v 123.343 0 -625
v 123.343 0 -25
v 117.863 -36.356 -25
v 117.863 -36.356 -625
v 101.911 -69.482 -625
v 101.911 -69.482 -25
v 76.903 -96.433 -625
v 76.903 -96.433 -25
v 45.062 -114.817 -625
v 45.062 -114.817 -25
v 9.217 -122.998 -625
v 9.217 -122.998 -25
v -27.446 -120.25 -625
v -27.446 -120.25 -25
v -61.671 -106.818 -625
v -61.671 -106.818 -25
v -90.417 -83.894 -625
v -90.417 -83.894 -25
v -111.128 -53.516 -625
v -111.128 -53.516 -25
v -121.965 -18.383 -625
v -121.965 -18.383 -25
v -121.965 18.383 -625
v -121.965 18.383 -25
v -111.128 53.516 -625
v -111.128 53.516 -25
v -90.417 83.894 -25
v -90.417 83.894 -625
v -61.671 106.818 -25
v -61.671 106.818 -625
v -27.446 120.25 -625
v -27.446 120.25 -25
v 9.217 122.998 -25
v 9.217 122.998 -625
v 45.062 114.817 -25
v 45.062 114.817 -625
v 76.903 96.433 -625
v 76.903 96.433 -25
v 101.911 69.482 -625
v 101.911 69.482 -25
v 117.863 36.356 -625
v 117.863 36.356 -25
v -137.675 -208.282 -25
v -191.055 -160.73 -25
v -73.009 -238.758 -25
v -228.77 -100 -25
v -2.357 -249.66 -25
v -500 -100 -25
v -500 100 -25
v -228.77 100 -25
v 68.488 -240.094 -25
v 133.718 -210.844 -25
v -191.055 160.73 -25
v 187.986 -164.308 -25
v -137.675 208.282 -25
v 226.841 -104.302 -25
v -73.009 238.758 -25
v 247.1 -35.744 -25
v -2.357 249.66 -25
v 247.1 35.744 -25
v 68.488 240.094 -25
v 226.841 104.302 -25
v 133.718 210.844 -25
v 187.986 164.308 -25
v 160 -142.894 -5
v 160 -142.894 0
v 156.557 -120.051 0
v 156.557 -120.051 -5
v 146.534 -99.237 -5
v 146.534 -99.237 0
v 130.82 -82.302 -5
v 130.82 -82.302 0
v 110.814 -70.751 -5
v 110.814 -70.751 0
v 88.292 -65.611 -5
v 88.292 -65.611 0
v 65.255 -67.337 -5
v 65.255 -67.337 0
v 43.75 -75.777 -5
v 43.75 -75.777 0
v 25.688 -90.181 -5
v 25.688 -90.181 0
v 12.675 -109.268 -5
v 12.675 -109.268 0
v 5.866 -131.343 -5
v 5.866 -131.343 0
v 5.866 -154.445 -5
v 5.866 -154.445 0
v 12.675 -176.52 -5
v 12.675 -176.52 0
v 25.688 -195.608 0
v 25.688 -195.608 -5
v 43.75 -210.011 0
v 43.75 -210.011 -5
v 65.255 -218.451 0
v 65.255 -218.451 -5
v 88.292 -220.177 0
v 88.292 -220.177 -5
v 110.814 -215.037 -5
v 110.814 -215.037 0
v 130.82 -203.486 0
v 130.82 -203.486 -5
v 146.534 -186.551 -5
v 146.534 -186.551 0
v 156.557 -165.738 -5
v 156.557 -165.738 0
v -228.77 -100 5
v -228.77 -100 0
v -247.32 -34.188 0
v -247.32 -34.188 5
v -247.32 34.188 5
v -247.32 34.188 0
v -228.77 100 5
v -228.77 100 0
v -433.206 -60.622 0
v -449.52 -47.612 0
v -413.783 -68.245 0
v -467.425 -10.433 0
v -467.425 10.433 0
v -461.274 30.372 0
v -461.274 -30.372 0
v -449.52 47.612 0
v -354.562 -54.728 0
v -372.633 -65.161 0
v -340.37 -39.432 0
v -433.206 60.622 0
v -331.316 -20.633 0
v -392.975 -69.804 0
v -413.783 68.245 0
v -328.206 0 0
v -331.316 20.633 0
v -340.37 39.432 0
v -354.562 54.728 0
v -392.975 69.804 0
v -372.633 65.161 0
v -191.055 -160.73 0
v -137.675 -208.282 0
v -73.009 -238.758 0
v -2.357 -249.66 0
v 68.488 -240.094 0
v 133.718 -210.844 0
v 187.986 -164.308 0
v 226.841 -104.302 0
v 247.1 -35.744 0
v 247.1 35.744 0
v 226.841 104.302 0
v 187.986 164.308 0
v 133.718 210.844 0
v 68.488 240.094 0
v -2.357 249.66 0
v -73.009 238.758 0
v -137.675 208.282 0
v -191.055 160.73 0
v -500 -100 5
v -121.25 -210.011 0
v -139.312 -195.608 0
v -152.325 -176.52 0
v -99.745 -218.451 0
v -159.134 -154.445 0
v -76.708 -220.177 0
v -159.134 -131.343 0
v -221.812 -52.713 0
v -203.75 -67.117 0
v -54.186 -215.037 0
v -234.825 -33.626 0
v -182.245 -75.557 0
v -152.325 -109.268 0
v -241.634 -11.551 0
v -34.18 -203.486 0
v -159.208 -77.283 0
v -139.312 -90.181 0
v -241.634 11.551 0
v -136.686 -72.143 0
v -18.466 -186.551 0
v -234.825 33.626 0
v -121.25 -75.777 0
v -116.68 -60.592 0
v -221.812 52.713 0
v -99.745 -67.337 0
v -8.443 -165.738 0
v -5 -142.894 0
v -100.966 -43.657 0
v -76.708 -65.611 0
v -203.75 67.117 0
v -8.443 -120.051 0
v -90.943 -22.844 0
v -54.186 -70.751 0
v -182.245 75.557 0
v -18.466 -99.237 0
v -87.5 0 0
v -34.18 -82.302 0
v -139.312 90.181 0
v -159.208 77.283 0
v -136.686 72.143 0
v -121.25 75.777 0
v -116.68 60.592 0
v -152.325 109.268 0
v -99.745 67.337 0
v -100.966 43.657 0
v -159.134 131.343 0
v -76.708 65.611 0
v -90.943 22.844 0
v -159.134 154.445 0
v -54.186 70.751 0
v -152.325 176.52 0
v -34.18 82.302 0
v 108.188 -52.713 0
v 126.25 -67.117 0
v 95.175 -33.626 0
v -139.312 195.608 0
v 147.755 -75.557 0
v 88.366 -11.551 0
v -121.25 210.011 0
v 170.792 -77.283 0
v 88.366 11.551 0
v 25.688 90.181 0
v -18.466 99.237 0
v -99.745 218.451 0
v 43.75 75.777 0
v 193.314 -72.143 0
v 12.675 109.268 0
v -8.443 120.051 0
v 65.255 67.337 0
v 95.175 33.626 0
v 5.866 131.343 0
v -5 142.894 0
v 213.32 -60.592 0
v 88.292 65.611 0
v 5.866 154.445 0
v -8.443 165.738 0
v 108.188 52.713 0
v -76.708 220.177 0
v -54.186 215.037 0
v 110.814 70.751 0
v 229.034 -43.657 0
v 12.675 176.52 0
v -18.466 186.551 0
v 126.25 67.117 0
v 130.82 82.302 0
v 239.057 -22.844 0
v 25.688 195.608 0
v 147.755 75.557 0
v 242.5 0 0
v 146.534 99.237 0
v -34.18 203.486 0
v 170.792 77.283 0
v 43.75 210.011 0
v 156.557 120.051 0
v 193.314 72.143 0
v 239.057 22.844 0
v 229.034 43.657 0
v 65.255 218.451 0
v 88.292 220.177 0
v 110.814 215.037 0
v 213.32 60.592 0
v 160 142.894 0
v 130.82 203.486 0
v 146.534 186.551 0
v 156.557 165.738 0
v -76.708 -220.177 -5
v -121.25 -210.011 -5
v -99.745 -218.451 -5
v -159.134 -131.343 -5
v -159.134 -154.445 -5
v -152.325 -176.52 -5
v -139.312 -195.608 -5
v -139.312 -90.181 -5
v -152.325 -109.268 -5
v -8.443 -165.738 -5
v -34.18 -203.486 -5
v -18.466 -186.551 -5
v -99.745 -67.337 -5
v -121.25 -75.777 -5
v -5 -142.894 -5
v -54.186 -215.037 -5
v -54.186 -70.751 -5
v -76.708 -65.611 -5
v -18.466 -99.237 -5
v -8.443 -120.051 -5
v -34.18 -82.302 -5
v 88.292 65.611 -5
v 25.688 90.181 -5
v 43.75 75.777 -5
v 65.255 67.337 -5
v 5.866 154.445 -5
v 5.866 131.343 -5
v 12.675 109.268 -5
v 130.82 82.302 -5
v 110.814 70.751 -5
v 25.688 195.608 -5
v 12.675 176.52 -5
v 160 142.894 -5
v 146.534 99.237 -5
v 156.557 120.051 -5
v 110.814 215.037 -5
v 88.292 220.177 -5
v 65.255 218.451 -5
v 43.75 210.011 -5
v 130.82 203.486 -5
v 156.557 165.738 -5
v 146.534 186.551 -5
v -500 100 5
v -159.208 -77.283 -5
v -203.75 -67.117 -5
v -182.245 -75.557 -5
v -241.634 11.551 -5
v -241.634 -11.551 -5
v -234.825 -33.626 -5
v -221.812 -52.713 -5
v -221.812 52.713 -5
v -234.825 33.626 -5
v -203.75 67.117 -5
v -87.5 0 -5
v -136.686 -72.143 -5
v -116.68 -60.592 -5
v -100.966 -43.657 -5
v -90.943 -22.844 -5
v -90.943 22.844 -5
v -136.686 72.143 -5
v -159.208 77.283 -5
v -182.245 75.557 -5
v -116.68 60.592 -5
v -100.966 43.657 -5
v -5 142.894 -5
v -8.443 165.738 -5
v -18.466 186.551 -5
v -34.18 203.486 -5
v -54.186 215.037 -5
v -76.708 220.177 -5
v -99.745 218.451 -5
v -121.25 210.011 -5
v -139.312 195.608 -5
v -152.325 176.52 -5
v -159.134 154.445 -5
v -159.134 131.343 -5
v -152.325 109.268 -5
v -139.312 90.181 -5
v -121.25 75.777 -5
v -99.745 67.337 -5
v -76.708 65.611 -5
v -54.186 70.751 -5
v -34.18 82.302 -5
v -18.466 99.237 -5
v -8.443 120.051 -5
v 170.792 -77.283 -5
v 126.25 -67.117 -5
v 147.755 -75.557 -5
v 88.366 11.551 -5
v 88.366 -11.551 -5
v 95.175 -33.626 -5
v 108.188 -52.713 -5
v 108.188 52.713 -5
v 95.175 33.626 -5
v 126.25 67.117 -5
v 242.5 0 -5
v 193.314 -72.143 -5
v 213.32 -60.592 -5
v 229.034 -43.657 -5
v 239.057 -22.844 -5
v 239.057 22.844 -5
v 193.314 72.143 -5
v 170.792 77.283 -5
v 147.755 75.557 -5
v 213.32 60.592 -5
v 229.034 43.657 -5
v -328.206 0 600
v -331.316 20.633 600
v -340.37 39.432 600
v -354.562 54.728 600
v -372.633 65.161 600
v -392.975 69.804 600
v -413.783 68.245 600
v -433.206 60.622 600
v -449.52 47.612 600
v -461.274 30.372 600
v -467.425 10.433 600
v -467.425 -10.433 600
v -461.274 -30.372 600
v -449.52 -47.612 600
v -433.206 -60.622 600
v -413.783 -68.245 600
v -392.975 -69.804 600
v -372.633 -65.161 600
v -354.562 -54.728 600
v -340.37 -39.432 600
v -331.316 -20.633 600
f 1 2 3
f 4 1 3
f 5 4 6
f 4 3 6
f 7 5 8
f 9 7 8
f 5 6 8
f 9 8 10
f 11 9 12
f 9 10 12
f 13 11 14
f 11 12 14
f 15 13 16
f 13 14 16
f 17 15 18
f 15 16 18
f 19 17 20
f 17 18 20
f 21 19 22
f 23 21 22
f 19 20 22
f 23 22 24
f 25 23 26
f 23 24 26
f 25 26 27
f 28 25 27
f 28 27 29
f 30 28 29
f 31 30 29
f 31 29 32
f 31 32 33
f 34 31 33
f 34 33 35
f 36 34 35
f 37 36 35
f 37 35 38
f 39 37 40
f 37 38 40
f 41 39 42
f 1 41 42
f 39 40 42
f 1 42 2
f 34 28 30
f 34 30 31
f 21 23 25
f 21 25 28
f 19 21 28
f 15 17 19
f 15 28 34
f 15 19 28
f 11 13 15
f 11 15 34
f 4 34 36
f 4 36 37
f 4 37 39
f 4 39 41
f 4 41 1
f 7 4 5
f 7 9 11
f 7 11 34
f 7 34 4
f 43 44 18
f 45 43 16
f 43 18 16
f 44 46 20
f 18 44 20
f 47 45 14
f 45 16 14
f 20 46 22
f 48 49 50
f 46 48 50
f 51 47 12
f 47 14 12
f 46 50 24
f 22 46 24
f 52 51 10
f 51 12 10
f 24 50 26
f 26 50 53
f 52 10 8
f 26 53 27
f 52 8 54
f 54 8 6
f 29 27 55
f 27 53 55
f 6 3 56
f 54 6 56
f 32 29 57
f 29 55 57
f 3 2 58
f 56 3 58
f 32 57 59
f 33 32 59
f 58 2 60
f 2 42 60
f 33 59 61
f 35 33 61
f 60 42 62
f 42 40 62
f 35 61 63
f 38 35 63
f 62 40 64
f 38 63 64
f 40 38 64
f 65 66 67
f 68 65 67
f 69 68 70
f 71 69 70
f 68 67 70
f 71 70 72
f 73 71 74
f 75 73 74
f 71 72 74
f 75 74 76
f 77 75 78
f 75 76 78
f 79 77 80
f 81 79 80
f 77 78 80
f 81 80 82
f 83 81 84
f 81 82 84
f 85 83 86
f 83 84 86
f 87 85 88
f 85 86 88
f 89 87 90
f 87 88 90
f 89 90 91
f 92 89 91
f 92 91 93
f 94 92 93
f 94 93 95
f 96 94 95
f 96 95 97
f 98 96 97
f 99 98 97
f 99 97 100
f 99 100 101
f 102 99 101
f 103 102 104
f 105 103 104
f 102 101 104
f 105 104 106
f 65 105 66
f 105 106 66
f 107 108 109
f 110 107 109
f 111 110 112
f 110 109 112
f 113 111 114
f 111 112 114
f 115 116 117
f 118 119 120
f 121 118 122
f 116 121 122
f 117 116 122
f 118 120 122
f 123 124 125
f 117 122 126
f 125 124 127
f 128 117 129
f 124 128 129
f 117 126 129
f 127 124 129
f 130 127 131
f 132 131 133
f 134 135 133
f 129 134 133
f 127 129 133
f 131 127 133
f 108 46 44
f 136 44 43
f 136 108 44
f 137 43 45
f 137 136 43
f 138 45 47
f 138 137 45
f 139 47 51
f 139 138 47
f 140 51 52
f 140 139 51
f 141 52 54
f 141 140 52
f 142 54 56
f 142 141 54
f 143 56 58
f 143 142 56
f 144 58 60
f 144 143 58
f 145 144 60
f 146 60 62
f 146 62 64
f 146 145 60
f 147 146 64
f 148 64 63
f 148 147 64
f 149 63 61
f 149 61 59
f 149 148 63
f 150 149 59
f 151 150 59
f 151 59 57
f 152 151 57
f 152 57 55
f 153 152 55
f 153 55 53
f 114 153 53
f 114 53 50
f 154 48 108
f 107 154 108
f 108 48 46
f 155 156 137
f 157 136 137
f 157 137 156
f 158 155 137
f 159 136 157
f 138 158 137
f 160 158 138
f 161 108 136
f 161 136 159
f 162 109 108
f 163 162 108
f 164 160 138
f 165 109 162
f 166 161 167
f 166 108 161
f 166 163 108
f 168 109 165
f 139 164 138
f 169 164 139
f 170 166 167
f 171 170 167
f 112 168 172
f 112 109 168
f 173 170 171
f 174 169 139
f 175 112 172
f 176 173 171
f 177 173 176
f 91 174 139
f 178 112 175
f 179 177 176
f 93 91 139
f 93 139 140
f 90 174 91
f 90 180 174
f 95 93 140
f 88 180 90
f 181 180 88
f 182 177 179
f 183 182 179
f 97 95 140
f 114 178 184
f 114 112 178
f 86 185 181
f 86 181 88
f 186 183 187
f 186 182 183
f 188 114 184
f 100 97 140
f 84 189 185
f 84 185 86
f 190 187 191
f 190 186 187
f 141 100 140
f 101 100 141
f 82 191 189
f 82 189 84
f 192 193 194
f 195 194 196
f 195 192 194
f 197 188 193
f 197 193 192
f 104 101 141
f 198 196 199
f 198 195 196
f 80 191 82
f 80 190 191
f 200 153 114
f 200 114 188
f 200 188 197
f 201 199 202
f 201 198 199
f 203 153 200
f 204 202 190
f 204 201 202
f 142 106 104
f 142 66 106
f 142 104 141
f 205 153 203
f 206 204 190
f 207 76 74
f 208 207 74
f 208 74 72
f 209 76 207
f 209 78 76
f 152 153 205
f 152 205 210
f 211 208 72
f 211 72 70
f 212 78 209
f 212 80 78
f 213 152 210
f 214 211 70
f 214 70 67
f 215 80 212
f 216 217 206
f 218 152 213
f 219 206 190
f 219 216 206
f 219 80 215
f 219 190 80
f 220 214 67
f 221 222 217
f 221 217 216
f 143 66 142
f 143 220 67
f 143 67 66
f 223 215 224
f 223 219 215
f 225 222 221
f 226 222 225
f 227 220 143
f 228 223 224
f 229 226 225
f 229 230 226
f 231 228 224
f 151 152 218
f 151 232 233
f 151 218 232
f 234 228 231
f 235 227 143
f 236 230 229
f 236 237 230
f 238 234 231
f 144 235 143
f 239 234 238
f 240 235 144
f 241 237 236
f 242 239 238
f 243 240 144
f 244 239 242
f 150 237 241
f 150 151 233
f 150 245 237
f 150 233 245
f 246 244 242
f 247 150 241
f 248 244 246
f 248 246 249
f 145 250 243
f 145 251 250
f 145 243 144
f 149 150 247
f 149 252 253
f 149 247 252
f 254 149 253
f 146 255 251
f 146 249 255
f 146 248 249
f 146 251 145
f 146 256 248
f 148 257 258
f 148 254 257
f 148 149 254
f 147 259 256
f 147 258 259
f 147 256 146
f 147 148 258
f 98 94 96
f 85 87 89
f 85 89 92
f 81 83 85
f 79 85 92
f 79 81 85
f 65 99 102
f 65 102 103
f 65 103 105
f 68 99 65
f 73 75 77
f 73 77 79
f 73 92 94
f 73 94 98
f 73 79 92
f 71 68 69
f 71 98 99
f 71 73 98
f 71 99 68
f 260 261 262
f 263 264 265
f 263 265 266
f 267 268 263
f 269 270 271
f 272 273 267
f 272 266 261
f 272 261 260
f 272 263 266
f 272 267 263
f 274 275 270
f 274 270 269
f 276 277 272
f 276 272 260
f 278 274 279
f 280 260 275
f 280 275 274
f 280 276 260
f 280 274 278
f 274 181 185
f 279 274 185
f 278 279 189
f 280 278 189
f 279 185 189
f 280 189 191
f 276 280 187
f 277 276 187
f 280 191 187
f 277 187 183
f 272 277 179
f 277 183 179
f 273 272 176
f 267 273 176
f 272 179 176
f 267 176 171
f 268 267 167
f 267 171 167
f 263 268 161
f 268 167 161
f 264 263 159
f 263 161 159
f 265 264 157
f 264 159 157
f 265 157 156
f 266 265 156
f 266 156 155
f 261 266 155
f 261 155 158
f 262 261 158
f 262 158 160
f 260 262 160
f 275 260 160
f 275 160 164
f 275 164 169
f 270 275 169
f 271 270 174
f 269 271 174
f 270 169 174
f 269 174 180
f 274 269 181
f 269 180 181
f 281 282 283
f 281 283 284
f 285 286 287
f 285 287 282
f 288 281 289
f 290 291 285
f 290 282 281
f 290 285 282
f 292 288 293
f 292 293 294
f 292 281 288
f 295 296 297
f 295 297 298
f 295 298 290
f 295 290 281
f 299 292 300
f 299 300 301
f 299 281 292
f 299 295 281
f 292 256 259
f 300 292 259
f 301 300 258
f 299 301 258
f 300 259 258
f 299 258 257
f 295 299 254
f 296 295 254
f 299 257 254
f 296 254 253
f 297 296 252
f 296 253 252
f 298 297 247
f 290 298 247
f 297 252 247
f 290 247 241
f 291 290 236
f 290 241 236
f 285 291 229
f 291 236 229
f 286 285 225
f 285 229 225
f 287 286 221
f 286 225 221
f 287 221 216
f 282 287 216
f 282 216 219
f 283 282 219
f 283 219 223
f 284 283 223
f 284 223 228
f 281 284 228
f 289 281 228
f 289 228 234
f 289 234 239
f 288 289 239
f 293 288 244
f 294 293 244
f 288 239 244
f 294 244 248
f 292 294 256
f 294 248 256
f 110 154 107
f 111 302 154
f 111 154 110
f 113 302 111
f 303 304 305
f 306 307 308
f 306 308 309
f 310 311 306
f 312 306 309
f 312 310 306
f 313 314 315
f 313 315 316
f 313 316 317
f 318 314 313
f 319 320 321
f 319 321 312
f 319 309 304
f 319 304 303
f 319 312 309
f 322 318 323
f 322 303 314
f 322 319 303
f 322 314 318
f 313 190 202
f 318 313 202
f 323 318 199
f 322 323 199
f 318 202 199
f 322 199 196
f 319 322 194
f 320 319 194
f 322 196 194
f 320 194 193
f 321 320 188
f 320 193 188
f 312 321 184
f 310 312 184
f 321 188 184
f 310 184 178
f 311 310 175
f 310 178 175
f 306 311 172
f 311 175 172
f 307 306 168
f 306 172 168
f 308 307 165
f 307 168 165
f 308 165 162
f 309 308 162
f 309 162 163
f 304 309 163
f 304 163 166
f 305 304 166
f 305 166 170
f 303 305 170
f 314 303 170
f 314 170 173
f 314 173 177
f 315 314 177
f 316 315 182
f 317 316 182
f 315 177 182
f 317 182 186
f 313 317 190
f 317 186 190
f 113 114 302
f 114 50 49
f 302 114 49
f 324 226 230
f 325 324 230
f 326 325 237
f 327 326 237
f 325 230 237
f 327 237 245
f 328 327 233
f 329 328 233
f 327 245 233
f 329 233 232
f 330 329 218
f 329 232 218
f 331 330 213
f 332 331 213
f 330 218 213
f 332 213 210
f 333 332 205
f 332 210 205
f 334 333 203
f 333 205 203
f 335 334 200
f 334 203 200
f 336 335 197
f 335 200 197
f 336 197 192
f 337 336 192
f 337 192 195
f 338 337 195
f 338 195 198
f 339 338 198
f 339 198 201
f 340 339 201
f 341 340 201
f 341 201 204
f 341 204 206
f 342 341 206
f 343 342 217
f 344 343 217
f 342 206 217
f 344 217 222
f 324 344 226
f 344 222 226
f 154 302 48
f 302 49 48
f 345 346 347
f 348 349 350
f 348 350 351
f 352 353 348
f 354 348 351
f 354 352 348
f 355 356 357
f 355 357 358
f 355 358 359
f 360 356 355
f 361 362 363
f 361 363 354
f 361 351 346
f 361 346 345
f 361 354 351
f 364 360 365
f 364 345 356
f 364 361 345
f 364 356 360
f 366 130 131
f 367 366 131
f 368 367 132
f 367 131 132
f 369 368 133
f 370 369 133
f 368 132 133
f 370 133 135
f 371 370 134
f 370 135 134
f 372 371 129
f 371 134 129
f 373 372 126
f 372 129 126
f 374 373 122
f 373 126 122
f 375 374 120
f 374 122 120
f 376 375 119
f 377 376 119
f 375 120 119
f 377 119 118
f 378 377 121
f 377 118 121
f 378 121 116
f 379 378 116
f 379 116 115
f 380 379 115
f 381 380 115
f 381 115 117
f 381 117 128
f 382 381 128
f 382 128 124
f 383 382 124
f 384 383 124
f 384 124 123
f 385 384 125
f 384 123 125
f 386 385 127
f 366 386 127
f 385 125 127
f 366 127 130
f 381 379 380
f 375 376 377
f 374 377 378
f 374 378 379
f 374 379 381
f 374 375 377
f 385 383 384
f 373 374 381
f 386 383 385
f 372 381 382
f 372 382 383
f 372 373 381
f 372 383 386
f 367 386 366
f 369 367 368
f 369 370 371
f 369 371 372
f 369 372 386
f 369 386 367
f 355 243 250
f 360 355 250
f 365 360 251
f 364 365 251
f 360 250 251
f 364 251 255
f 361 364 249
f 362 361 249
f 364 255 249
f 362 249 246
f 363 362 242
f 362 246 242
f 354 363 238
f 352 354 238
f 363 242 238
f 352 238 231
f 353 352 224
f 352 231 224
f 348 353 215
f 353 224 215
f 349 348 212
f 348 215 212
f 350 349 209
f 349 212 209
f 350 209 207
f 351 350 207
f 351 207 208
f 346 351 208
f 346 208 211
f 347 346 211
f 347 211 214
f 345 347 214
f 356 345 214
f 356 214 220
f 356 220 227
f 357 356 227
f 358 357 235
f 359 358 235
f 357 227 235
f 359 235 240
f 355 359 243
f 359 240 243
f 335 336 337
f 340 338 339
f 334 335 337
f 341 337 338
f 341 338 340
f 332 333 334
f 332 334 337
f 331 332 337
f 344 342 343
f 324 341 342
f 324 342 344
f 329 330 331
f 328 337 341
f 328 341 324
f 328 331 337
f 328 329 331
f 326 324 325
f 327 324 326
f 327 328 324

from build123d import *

# Parameters (mm, degrees)
F0_R          = 249.6714141726
F0_R_2        = 77.5
F1_DEPTH      = 25
F2_DEPTH      = 5
F3_R          = 70
F4_DEPTH      = 25
F4_DEPTH_BACK = 5
F5_DEPTH      = 600
F6_R          = 123.3429255196
F7_DEPTH      = 600


with BuildPart() as f1:
    # F0 (on Top) → F1 (new body)
    with BuildSketch(Plane.XY):
        Circle(F0_R)
        with Locations((-82.5, -142.8941916244)):
            Circle(F0_R_2, mode=Mode.SUBTRACT)
        with Locations((82.5, -142.8941916244)):
            Circle(F0_R_2, mode=Mode.SUBTRACT)
        with Locations((-165, 0)):
            Circle(F0_R_2, mode=Mode.SUBTRACT)
        with Locations((-82.5, 142.8941916244)):
            Circle(F0_R_2, mode=Mode.SUBTRACT)
        with Locations((165, 0)):
            Circle(F0_R_2, mode=Mode.SUBTRACT)
        with Locations((82.5, 142.8941916244)):
            Circle(F0_R_2, mode=Mode.SUBTRACT)
        with Locations((-82.5, 142.8941916244)):
            Circle(F0_R_2)
        with Locations((82.5, 142.8941916244)):
            Circle(F0_R_2)
        with Locations((165, 0)):
            Circle(F0_R_2)
        with Locations((-165, 0)):
            Circle(F0_R_2)
        with Locations((-82.5, -142.8941916244)):
            Circle(F0_R_2)
        with Locations((82.5, -142.8941916244)):
            Circle(F0_R_2)
    extrude(amount=-F1_DEPTH)

    # F0 (on Top) → F2 (cut)
    with BuildSketch(Plane.XY):
        with Locations((-82.5, 142.8941916244)):
            Circle(F0_R_2)
        with Locations((82.5, 142.8941916244)):
            Circle(F0_R_2)
        with Locations((165, 0)):
            Circle(F0_R_2)
        with Locations((82.5, -142.8941916244)):
            Circle(F0_R_2)
        with Locations((-82.5, -142.8941916244)):
            Circle(F0_R_2)
        with Locations((-165, 0)):
            Circle(F0_R_2)
    extrude(amount=-F2_DEPTH, mode=Mode.SUBTRACT)

    # F3 (on face) → F4 (join, two sides)
    with BuildSketch(Plane.XY) as f4_sk:
        with BuildLine():
            ThreePointArc((-228.7702232699, -100), (-249.6714141726, 0), (-228.7702232699, 100))
            Line((-228.7702232699, 100), (-500, 100))
            Line((-500, 100), (-500, -100))
            Line((-500, -100), (-228.7702232699, -100))
        make_face()
        with Locations((-398.2064127922, 0)):
            Circle(F3_R, mode=Mode.SUBTRACT)
        with Locations((-398.2064127922, 0)):
            Circle(F3_R)
    extrude(amount=-F4_DEPTH)
    extrude(f4_sk.sketch, amount=F4_DEPTH_BACK)

    # F6 (on face) → F7 (join)
    with BuildSketch(Plane(origin=(0, 0, -25), x_dir=(1, 0, 0), z_dir=(0, 0, -1))):
        Circle(F6_R)
    extrude(amount=F7_DEPTH)


with BuildPart() as f5:
    # F3 (on face) → F5 (new body)
    with BuildSketch(Plane.XY):
        with Locations((-398.2064127922, 0)):
            Circle(F3_R)
    extrude(amount=F5_DEPTH)


solid = Compound([f1.part, f5.part])
